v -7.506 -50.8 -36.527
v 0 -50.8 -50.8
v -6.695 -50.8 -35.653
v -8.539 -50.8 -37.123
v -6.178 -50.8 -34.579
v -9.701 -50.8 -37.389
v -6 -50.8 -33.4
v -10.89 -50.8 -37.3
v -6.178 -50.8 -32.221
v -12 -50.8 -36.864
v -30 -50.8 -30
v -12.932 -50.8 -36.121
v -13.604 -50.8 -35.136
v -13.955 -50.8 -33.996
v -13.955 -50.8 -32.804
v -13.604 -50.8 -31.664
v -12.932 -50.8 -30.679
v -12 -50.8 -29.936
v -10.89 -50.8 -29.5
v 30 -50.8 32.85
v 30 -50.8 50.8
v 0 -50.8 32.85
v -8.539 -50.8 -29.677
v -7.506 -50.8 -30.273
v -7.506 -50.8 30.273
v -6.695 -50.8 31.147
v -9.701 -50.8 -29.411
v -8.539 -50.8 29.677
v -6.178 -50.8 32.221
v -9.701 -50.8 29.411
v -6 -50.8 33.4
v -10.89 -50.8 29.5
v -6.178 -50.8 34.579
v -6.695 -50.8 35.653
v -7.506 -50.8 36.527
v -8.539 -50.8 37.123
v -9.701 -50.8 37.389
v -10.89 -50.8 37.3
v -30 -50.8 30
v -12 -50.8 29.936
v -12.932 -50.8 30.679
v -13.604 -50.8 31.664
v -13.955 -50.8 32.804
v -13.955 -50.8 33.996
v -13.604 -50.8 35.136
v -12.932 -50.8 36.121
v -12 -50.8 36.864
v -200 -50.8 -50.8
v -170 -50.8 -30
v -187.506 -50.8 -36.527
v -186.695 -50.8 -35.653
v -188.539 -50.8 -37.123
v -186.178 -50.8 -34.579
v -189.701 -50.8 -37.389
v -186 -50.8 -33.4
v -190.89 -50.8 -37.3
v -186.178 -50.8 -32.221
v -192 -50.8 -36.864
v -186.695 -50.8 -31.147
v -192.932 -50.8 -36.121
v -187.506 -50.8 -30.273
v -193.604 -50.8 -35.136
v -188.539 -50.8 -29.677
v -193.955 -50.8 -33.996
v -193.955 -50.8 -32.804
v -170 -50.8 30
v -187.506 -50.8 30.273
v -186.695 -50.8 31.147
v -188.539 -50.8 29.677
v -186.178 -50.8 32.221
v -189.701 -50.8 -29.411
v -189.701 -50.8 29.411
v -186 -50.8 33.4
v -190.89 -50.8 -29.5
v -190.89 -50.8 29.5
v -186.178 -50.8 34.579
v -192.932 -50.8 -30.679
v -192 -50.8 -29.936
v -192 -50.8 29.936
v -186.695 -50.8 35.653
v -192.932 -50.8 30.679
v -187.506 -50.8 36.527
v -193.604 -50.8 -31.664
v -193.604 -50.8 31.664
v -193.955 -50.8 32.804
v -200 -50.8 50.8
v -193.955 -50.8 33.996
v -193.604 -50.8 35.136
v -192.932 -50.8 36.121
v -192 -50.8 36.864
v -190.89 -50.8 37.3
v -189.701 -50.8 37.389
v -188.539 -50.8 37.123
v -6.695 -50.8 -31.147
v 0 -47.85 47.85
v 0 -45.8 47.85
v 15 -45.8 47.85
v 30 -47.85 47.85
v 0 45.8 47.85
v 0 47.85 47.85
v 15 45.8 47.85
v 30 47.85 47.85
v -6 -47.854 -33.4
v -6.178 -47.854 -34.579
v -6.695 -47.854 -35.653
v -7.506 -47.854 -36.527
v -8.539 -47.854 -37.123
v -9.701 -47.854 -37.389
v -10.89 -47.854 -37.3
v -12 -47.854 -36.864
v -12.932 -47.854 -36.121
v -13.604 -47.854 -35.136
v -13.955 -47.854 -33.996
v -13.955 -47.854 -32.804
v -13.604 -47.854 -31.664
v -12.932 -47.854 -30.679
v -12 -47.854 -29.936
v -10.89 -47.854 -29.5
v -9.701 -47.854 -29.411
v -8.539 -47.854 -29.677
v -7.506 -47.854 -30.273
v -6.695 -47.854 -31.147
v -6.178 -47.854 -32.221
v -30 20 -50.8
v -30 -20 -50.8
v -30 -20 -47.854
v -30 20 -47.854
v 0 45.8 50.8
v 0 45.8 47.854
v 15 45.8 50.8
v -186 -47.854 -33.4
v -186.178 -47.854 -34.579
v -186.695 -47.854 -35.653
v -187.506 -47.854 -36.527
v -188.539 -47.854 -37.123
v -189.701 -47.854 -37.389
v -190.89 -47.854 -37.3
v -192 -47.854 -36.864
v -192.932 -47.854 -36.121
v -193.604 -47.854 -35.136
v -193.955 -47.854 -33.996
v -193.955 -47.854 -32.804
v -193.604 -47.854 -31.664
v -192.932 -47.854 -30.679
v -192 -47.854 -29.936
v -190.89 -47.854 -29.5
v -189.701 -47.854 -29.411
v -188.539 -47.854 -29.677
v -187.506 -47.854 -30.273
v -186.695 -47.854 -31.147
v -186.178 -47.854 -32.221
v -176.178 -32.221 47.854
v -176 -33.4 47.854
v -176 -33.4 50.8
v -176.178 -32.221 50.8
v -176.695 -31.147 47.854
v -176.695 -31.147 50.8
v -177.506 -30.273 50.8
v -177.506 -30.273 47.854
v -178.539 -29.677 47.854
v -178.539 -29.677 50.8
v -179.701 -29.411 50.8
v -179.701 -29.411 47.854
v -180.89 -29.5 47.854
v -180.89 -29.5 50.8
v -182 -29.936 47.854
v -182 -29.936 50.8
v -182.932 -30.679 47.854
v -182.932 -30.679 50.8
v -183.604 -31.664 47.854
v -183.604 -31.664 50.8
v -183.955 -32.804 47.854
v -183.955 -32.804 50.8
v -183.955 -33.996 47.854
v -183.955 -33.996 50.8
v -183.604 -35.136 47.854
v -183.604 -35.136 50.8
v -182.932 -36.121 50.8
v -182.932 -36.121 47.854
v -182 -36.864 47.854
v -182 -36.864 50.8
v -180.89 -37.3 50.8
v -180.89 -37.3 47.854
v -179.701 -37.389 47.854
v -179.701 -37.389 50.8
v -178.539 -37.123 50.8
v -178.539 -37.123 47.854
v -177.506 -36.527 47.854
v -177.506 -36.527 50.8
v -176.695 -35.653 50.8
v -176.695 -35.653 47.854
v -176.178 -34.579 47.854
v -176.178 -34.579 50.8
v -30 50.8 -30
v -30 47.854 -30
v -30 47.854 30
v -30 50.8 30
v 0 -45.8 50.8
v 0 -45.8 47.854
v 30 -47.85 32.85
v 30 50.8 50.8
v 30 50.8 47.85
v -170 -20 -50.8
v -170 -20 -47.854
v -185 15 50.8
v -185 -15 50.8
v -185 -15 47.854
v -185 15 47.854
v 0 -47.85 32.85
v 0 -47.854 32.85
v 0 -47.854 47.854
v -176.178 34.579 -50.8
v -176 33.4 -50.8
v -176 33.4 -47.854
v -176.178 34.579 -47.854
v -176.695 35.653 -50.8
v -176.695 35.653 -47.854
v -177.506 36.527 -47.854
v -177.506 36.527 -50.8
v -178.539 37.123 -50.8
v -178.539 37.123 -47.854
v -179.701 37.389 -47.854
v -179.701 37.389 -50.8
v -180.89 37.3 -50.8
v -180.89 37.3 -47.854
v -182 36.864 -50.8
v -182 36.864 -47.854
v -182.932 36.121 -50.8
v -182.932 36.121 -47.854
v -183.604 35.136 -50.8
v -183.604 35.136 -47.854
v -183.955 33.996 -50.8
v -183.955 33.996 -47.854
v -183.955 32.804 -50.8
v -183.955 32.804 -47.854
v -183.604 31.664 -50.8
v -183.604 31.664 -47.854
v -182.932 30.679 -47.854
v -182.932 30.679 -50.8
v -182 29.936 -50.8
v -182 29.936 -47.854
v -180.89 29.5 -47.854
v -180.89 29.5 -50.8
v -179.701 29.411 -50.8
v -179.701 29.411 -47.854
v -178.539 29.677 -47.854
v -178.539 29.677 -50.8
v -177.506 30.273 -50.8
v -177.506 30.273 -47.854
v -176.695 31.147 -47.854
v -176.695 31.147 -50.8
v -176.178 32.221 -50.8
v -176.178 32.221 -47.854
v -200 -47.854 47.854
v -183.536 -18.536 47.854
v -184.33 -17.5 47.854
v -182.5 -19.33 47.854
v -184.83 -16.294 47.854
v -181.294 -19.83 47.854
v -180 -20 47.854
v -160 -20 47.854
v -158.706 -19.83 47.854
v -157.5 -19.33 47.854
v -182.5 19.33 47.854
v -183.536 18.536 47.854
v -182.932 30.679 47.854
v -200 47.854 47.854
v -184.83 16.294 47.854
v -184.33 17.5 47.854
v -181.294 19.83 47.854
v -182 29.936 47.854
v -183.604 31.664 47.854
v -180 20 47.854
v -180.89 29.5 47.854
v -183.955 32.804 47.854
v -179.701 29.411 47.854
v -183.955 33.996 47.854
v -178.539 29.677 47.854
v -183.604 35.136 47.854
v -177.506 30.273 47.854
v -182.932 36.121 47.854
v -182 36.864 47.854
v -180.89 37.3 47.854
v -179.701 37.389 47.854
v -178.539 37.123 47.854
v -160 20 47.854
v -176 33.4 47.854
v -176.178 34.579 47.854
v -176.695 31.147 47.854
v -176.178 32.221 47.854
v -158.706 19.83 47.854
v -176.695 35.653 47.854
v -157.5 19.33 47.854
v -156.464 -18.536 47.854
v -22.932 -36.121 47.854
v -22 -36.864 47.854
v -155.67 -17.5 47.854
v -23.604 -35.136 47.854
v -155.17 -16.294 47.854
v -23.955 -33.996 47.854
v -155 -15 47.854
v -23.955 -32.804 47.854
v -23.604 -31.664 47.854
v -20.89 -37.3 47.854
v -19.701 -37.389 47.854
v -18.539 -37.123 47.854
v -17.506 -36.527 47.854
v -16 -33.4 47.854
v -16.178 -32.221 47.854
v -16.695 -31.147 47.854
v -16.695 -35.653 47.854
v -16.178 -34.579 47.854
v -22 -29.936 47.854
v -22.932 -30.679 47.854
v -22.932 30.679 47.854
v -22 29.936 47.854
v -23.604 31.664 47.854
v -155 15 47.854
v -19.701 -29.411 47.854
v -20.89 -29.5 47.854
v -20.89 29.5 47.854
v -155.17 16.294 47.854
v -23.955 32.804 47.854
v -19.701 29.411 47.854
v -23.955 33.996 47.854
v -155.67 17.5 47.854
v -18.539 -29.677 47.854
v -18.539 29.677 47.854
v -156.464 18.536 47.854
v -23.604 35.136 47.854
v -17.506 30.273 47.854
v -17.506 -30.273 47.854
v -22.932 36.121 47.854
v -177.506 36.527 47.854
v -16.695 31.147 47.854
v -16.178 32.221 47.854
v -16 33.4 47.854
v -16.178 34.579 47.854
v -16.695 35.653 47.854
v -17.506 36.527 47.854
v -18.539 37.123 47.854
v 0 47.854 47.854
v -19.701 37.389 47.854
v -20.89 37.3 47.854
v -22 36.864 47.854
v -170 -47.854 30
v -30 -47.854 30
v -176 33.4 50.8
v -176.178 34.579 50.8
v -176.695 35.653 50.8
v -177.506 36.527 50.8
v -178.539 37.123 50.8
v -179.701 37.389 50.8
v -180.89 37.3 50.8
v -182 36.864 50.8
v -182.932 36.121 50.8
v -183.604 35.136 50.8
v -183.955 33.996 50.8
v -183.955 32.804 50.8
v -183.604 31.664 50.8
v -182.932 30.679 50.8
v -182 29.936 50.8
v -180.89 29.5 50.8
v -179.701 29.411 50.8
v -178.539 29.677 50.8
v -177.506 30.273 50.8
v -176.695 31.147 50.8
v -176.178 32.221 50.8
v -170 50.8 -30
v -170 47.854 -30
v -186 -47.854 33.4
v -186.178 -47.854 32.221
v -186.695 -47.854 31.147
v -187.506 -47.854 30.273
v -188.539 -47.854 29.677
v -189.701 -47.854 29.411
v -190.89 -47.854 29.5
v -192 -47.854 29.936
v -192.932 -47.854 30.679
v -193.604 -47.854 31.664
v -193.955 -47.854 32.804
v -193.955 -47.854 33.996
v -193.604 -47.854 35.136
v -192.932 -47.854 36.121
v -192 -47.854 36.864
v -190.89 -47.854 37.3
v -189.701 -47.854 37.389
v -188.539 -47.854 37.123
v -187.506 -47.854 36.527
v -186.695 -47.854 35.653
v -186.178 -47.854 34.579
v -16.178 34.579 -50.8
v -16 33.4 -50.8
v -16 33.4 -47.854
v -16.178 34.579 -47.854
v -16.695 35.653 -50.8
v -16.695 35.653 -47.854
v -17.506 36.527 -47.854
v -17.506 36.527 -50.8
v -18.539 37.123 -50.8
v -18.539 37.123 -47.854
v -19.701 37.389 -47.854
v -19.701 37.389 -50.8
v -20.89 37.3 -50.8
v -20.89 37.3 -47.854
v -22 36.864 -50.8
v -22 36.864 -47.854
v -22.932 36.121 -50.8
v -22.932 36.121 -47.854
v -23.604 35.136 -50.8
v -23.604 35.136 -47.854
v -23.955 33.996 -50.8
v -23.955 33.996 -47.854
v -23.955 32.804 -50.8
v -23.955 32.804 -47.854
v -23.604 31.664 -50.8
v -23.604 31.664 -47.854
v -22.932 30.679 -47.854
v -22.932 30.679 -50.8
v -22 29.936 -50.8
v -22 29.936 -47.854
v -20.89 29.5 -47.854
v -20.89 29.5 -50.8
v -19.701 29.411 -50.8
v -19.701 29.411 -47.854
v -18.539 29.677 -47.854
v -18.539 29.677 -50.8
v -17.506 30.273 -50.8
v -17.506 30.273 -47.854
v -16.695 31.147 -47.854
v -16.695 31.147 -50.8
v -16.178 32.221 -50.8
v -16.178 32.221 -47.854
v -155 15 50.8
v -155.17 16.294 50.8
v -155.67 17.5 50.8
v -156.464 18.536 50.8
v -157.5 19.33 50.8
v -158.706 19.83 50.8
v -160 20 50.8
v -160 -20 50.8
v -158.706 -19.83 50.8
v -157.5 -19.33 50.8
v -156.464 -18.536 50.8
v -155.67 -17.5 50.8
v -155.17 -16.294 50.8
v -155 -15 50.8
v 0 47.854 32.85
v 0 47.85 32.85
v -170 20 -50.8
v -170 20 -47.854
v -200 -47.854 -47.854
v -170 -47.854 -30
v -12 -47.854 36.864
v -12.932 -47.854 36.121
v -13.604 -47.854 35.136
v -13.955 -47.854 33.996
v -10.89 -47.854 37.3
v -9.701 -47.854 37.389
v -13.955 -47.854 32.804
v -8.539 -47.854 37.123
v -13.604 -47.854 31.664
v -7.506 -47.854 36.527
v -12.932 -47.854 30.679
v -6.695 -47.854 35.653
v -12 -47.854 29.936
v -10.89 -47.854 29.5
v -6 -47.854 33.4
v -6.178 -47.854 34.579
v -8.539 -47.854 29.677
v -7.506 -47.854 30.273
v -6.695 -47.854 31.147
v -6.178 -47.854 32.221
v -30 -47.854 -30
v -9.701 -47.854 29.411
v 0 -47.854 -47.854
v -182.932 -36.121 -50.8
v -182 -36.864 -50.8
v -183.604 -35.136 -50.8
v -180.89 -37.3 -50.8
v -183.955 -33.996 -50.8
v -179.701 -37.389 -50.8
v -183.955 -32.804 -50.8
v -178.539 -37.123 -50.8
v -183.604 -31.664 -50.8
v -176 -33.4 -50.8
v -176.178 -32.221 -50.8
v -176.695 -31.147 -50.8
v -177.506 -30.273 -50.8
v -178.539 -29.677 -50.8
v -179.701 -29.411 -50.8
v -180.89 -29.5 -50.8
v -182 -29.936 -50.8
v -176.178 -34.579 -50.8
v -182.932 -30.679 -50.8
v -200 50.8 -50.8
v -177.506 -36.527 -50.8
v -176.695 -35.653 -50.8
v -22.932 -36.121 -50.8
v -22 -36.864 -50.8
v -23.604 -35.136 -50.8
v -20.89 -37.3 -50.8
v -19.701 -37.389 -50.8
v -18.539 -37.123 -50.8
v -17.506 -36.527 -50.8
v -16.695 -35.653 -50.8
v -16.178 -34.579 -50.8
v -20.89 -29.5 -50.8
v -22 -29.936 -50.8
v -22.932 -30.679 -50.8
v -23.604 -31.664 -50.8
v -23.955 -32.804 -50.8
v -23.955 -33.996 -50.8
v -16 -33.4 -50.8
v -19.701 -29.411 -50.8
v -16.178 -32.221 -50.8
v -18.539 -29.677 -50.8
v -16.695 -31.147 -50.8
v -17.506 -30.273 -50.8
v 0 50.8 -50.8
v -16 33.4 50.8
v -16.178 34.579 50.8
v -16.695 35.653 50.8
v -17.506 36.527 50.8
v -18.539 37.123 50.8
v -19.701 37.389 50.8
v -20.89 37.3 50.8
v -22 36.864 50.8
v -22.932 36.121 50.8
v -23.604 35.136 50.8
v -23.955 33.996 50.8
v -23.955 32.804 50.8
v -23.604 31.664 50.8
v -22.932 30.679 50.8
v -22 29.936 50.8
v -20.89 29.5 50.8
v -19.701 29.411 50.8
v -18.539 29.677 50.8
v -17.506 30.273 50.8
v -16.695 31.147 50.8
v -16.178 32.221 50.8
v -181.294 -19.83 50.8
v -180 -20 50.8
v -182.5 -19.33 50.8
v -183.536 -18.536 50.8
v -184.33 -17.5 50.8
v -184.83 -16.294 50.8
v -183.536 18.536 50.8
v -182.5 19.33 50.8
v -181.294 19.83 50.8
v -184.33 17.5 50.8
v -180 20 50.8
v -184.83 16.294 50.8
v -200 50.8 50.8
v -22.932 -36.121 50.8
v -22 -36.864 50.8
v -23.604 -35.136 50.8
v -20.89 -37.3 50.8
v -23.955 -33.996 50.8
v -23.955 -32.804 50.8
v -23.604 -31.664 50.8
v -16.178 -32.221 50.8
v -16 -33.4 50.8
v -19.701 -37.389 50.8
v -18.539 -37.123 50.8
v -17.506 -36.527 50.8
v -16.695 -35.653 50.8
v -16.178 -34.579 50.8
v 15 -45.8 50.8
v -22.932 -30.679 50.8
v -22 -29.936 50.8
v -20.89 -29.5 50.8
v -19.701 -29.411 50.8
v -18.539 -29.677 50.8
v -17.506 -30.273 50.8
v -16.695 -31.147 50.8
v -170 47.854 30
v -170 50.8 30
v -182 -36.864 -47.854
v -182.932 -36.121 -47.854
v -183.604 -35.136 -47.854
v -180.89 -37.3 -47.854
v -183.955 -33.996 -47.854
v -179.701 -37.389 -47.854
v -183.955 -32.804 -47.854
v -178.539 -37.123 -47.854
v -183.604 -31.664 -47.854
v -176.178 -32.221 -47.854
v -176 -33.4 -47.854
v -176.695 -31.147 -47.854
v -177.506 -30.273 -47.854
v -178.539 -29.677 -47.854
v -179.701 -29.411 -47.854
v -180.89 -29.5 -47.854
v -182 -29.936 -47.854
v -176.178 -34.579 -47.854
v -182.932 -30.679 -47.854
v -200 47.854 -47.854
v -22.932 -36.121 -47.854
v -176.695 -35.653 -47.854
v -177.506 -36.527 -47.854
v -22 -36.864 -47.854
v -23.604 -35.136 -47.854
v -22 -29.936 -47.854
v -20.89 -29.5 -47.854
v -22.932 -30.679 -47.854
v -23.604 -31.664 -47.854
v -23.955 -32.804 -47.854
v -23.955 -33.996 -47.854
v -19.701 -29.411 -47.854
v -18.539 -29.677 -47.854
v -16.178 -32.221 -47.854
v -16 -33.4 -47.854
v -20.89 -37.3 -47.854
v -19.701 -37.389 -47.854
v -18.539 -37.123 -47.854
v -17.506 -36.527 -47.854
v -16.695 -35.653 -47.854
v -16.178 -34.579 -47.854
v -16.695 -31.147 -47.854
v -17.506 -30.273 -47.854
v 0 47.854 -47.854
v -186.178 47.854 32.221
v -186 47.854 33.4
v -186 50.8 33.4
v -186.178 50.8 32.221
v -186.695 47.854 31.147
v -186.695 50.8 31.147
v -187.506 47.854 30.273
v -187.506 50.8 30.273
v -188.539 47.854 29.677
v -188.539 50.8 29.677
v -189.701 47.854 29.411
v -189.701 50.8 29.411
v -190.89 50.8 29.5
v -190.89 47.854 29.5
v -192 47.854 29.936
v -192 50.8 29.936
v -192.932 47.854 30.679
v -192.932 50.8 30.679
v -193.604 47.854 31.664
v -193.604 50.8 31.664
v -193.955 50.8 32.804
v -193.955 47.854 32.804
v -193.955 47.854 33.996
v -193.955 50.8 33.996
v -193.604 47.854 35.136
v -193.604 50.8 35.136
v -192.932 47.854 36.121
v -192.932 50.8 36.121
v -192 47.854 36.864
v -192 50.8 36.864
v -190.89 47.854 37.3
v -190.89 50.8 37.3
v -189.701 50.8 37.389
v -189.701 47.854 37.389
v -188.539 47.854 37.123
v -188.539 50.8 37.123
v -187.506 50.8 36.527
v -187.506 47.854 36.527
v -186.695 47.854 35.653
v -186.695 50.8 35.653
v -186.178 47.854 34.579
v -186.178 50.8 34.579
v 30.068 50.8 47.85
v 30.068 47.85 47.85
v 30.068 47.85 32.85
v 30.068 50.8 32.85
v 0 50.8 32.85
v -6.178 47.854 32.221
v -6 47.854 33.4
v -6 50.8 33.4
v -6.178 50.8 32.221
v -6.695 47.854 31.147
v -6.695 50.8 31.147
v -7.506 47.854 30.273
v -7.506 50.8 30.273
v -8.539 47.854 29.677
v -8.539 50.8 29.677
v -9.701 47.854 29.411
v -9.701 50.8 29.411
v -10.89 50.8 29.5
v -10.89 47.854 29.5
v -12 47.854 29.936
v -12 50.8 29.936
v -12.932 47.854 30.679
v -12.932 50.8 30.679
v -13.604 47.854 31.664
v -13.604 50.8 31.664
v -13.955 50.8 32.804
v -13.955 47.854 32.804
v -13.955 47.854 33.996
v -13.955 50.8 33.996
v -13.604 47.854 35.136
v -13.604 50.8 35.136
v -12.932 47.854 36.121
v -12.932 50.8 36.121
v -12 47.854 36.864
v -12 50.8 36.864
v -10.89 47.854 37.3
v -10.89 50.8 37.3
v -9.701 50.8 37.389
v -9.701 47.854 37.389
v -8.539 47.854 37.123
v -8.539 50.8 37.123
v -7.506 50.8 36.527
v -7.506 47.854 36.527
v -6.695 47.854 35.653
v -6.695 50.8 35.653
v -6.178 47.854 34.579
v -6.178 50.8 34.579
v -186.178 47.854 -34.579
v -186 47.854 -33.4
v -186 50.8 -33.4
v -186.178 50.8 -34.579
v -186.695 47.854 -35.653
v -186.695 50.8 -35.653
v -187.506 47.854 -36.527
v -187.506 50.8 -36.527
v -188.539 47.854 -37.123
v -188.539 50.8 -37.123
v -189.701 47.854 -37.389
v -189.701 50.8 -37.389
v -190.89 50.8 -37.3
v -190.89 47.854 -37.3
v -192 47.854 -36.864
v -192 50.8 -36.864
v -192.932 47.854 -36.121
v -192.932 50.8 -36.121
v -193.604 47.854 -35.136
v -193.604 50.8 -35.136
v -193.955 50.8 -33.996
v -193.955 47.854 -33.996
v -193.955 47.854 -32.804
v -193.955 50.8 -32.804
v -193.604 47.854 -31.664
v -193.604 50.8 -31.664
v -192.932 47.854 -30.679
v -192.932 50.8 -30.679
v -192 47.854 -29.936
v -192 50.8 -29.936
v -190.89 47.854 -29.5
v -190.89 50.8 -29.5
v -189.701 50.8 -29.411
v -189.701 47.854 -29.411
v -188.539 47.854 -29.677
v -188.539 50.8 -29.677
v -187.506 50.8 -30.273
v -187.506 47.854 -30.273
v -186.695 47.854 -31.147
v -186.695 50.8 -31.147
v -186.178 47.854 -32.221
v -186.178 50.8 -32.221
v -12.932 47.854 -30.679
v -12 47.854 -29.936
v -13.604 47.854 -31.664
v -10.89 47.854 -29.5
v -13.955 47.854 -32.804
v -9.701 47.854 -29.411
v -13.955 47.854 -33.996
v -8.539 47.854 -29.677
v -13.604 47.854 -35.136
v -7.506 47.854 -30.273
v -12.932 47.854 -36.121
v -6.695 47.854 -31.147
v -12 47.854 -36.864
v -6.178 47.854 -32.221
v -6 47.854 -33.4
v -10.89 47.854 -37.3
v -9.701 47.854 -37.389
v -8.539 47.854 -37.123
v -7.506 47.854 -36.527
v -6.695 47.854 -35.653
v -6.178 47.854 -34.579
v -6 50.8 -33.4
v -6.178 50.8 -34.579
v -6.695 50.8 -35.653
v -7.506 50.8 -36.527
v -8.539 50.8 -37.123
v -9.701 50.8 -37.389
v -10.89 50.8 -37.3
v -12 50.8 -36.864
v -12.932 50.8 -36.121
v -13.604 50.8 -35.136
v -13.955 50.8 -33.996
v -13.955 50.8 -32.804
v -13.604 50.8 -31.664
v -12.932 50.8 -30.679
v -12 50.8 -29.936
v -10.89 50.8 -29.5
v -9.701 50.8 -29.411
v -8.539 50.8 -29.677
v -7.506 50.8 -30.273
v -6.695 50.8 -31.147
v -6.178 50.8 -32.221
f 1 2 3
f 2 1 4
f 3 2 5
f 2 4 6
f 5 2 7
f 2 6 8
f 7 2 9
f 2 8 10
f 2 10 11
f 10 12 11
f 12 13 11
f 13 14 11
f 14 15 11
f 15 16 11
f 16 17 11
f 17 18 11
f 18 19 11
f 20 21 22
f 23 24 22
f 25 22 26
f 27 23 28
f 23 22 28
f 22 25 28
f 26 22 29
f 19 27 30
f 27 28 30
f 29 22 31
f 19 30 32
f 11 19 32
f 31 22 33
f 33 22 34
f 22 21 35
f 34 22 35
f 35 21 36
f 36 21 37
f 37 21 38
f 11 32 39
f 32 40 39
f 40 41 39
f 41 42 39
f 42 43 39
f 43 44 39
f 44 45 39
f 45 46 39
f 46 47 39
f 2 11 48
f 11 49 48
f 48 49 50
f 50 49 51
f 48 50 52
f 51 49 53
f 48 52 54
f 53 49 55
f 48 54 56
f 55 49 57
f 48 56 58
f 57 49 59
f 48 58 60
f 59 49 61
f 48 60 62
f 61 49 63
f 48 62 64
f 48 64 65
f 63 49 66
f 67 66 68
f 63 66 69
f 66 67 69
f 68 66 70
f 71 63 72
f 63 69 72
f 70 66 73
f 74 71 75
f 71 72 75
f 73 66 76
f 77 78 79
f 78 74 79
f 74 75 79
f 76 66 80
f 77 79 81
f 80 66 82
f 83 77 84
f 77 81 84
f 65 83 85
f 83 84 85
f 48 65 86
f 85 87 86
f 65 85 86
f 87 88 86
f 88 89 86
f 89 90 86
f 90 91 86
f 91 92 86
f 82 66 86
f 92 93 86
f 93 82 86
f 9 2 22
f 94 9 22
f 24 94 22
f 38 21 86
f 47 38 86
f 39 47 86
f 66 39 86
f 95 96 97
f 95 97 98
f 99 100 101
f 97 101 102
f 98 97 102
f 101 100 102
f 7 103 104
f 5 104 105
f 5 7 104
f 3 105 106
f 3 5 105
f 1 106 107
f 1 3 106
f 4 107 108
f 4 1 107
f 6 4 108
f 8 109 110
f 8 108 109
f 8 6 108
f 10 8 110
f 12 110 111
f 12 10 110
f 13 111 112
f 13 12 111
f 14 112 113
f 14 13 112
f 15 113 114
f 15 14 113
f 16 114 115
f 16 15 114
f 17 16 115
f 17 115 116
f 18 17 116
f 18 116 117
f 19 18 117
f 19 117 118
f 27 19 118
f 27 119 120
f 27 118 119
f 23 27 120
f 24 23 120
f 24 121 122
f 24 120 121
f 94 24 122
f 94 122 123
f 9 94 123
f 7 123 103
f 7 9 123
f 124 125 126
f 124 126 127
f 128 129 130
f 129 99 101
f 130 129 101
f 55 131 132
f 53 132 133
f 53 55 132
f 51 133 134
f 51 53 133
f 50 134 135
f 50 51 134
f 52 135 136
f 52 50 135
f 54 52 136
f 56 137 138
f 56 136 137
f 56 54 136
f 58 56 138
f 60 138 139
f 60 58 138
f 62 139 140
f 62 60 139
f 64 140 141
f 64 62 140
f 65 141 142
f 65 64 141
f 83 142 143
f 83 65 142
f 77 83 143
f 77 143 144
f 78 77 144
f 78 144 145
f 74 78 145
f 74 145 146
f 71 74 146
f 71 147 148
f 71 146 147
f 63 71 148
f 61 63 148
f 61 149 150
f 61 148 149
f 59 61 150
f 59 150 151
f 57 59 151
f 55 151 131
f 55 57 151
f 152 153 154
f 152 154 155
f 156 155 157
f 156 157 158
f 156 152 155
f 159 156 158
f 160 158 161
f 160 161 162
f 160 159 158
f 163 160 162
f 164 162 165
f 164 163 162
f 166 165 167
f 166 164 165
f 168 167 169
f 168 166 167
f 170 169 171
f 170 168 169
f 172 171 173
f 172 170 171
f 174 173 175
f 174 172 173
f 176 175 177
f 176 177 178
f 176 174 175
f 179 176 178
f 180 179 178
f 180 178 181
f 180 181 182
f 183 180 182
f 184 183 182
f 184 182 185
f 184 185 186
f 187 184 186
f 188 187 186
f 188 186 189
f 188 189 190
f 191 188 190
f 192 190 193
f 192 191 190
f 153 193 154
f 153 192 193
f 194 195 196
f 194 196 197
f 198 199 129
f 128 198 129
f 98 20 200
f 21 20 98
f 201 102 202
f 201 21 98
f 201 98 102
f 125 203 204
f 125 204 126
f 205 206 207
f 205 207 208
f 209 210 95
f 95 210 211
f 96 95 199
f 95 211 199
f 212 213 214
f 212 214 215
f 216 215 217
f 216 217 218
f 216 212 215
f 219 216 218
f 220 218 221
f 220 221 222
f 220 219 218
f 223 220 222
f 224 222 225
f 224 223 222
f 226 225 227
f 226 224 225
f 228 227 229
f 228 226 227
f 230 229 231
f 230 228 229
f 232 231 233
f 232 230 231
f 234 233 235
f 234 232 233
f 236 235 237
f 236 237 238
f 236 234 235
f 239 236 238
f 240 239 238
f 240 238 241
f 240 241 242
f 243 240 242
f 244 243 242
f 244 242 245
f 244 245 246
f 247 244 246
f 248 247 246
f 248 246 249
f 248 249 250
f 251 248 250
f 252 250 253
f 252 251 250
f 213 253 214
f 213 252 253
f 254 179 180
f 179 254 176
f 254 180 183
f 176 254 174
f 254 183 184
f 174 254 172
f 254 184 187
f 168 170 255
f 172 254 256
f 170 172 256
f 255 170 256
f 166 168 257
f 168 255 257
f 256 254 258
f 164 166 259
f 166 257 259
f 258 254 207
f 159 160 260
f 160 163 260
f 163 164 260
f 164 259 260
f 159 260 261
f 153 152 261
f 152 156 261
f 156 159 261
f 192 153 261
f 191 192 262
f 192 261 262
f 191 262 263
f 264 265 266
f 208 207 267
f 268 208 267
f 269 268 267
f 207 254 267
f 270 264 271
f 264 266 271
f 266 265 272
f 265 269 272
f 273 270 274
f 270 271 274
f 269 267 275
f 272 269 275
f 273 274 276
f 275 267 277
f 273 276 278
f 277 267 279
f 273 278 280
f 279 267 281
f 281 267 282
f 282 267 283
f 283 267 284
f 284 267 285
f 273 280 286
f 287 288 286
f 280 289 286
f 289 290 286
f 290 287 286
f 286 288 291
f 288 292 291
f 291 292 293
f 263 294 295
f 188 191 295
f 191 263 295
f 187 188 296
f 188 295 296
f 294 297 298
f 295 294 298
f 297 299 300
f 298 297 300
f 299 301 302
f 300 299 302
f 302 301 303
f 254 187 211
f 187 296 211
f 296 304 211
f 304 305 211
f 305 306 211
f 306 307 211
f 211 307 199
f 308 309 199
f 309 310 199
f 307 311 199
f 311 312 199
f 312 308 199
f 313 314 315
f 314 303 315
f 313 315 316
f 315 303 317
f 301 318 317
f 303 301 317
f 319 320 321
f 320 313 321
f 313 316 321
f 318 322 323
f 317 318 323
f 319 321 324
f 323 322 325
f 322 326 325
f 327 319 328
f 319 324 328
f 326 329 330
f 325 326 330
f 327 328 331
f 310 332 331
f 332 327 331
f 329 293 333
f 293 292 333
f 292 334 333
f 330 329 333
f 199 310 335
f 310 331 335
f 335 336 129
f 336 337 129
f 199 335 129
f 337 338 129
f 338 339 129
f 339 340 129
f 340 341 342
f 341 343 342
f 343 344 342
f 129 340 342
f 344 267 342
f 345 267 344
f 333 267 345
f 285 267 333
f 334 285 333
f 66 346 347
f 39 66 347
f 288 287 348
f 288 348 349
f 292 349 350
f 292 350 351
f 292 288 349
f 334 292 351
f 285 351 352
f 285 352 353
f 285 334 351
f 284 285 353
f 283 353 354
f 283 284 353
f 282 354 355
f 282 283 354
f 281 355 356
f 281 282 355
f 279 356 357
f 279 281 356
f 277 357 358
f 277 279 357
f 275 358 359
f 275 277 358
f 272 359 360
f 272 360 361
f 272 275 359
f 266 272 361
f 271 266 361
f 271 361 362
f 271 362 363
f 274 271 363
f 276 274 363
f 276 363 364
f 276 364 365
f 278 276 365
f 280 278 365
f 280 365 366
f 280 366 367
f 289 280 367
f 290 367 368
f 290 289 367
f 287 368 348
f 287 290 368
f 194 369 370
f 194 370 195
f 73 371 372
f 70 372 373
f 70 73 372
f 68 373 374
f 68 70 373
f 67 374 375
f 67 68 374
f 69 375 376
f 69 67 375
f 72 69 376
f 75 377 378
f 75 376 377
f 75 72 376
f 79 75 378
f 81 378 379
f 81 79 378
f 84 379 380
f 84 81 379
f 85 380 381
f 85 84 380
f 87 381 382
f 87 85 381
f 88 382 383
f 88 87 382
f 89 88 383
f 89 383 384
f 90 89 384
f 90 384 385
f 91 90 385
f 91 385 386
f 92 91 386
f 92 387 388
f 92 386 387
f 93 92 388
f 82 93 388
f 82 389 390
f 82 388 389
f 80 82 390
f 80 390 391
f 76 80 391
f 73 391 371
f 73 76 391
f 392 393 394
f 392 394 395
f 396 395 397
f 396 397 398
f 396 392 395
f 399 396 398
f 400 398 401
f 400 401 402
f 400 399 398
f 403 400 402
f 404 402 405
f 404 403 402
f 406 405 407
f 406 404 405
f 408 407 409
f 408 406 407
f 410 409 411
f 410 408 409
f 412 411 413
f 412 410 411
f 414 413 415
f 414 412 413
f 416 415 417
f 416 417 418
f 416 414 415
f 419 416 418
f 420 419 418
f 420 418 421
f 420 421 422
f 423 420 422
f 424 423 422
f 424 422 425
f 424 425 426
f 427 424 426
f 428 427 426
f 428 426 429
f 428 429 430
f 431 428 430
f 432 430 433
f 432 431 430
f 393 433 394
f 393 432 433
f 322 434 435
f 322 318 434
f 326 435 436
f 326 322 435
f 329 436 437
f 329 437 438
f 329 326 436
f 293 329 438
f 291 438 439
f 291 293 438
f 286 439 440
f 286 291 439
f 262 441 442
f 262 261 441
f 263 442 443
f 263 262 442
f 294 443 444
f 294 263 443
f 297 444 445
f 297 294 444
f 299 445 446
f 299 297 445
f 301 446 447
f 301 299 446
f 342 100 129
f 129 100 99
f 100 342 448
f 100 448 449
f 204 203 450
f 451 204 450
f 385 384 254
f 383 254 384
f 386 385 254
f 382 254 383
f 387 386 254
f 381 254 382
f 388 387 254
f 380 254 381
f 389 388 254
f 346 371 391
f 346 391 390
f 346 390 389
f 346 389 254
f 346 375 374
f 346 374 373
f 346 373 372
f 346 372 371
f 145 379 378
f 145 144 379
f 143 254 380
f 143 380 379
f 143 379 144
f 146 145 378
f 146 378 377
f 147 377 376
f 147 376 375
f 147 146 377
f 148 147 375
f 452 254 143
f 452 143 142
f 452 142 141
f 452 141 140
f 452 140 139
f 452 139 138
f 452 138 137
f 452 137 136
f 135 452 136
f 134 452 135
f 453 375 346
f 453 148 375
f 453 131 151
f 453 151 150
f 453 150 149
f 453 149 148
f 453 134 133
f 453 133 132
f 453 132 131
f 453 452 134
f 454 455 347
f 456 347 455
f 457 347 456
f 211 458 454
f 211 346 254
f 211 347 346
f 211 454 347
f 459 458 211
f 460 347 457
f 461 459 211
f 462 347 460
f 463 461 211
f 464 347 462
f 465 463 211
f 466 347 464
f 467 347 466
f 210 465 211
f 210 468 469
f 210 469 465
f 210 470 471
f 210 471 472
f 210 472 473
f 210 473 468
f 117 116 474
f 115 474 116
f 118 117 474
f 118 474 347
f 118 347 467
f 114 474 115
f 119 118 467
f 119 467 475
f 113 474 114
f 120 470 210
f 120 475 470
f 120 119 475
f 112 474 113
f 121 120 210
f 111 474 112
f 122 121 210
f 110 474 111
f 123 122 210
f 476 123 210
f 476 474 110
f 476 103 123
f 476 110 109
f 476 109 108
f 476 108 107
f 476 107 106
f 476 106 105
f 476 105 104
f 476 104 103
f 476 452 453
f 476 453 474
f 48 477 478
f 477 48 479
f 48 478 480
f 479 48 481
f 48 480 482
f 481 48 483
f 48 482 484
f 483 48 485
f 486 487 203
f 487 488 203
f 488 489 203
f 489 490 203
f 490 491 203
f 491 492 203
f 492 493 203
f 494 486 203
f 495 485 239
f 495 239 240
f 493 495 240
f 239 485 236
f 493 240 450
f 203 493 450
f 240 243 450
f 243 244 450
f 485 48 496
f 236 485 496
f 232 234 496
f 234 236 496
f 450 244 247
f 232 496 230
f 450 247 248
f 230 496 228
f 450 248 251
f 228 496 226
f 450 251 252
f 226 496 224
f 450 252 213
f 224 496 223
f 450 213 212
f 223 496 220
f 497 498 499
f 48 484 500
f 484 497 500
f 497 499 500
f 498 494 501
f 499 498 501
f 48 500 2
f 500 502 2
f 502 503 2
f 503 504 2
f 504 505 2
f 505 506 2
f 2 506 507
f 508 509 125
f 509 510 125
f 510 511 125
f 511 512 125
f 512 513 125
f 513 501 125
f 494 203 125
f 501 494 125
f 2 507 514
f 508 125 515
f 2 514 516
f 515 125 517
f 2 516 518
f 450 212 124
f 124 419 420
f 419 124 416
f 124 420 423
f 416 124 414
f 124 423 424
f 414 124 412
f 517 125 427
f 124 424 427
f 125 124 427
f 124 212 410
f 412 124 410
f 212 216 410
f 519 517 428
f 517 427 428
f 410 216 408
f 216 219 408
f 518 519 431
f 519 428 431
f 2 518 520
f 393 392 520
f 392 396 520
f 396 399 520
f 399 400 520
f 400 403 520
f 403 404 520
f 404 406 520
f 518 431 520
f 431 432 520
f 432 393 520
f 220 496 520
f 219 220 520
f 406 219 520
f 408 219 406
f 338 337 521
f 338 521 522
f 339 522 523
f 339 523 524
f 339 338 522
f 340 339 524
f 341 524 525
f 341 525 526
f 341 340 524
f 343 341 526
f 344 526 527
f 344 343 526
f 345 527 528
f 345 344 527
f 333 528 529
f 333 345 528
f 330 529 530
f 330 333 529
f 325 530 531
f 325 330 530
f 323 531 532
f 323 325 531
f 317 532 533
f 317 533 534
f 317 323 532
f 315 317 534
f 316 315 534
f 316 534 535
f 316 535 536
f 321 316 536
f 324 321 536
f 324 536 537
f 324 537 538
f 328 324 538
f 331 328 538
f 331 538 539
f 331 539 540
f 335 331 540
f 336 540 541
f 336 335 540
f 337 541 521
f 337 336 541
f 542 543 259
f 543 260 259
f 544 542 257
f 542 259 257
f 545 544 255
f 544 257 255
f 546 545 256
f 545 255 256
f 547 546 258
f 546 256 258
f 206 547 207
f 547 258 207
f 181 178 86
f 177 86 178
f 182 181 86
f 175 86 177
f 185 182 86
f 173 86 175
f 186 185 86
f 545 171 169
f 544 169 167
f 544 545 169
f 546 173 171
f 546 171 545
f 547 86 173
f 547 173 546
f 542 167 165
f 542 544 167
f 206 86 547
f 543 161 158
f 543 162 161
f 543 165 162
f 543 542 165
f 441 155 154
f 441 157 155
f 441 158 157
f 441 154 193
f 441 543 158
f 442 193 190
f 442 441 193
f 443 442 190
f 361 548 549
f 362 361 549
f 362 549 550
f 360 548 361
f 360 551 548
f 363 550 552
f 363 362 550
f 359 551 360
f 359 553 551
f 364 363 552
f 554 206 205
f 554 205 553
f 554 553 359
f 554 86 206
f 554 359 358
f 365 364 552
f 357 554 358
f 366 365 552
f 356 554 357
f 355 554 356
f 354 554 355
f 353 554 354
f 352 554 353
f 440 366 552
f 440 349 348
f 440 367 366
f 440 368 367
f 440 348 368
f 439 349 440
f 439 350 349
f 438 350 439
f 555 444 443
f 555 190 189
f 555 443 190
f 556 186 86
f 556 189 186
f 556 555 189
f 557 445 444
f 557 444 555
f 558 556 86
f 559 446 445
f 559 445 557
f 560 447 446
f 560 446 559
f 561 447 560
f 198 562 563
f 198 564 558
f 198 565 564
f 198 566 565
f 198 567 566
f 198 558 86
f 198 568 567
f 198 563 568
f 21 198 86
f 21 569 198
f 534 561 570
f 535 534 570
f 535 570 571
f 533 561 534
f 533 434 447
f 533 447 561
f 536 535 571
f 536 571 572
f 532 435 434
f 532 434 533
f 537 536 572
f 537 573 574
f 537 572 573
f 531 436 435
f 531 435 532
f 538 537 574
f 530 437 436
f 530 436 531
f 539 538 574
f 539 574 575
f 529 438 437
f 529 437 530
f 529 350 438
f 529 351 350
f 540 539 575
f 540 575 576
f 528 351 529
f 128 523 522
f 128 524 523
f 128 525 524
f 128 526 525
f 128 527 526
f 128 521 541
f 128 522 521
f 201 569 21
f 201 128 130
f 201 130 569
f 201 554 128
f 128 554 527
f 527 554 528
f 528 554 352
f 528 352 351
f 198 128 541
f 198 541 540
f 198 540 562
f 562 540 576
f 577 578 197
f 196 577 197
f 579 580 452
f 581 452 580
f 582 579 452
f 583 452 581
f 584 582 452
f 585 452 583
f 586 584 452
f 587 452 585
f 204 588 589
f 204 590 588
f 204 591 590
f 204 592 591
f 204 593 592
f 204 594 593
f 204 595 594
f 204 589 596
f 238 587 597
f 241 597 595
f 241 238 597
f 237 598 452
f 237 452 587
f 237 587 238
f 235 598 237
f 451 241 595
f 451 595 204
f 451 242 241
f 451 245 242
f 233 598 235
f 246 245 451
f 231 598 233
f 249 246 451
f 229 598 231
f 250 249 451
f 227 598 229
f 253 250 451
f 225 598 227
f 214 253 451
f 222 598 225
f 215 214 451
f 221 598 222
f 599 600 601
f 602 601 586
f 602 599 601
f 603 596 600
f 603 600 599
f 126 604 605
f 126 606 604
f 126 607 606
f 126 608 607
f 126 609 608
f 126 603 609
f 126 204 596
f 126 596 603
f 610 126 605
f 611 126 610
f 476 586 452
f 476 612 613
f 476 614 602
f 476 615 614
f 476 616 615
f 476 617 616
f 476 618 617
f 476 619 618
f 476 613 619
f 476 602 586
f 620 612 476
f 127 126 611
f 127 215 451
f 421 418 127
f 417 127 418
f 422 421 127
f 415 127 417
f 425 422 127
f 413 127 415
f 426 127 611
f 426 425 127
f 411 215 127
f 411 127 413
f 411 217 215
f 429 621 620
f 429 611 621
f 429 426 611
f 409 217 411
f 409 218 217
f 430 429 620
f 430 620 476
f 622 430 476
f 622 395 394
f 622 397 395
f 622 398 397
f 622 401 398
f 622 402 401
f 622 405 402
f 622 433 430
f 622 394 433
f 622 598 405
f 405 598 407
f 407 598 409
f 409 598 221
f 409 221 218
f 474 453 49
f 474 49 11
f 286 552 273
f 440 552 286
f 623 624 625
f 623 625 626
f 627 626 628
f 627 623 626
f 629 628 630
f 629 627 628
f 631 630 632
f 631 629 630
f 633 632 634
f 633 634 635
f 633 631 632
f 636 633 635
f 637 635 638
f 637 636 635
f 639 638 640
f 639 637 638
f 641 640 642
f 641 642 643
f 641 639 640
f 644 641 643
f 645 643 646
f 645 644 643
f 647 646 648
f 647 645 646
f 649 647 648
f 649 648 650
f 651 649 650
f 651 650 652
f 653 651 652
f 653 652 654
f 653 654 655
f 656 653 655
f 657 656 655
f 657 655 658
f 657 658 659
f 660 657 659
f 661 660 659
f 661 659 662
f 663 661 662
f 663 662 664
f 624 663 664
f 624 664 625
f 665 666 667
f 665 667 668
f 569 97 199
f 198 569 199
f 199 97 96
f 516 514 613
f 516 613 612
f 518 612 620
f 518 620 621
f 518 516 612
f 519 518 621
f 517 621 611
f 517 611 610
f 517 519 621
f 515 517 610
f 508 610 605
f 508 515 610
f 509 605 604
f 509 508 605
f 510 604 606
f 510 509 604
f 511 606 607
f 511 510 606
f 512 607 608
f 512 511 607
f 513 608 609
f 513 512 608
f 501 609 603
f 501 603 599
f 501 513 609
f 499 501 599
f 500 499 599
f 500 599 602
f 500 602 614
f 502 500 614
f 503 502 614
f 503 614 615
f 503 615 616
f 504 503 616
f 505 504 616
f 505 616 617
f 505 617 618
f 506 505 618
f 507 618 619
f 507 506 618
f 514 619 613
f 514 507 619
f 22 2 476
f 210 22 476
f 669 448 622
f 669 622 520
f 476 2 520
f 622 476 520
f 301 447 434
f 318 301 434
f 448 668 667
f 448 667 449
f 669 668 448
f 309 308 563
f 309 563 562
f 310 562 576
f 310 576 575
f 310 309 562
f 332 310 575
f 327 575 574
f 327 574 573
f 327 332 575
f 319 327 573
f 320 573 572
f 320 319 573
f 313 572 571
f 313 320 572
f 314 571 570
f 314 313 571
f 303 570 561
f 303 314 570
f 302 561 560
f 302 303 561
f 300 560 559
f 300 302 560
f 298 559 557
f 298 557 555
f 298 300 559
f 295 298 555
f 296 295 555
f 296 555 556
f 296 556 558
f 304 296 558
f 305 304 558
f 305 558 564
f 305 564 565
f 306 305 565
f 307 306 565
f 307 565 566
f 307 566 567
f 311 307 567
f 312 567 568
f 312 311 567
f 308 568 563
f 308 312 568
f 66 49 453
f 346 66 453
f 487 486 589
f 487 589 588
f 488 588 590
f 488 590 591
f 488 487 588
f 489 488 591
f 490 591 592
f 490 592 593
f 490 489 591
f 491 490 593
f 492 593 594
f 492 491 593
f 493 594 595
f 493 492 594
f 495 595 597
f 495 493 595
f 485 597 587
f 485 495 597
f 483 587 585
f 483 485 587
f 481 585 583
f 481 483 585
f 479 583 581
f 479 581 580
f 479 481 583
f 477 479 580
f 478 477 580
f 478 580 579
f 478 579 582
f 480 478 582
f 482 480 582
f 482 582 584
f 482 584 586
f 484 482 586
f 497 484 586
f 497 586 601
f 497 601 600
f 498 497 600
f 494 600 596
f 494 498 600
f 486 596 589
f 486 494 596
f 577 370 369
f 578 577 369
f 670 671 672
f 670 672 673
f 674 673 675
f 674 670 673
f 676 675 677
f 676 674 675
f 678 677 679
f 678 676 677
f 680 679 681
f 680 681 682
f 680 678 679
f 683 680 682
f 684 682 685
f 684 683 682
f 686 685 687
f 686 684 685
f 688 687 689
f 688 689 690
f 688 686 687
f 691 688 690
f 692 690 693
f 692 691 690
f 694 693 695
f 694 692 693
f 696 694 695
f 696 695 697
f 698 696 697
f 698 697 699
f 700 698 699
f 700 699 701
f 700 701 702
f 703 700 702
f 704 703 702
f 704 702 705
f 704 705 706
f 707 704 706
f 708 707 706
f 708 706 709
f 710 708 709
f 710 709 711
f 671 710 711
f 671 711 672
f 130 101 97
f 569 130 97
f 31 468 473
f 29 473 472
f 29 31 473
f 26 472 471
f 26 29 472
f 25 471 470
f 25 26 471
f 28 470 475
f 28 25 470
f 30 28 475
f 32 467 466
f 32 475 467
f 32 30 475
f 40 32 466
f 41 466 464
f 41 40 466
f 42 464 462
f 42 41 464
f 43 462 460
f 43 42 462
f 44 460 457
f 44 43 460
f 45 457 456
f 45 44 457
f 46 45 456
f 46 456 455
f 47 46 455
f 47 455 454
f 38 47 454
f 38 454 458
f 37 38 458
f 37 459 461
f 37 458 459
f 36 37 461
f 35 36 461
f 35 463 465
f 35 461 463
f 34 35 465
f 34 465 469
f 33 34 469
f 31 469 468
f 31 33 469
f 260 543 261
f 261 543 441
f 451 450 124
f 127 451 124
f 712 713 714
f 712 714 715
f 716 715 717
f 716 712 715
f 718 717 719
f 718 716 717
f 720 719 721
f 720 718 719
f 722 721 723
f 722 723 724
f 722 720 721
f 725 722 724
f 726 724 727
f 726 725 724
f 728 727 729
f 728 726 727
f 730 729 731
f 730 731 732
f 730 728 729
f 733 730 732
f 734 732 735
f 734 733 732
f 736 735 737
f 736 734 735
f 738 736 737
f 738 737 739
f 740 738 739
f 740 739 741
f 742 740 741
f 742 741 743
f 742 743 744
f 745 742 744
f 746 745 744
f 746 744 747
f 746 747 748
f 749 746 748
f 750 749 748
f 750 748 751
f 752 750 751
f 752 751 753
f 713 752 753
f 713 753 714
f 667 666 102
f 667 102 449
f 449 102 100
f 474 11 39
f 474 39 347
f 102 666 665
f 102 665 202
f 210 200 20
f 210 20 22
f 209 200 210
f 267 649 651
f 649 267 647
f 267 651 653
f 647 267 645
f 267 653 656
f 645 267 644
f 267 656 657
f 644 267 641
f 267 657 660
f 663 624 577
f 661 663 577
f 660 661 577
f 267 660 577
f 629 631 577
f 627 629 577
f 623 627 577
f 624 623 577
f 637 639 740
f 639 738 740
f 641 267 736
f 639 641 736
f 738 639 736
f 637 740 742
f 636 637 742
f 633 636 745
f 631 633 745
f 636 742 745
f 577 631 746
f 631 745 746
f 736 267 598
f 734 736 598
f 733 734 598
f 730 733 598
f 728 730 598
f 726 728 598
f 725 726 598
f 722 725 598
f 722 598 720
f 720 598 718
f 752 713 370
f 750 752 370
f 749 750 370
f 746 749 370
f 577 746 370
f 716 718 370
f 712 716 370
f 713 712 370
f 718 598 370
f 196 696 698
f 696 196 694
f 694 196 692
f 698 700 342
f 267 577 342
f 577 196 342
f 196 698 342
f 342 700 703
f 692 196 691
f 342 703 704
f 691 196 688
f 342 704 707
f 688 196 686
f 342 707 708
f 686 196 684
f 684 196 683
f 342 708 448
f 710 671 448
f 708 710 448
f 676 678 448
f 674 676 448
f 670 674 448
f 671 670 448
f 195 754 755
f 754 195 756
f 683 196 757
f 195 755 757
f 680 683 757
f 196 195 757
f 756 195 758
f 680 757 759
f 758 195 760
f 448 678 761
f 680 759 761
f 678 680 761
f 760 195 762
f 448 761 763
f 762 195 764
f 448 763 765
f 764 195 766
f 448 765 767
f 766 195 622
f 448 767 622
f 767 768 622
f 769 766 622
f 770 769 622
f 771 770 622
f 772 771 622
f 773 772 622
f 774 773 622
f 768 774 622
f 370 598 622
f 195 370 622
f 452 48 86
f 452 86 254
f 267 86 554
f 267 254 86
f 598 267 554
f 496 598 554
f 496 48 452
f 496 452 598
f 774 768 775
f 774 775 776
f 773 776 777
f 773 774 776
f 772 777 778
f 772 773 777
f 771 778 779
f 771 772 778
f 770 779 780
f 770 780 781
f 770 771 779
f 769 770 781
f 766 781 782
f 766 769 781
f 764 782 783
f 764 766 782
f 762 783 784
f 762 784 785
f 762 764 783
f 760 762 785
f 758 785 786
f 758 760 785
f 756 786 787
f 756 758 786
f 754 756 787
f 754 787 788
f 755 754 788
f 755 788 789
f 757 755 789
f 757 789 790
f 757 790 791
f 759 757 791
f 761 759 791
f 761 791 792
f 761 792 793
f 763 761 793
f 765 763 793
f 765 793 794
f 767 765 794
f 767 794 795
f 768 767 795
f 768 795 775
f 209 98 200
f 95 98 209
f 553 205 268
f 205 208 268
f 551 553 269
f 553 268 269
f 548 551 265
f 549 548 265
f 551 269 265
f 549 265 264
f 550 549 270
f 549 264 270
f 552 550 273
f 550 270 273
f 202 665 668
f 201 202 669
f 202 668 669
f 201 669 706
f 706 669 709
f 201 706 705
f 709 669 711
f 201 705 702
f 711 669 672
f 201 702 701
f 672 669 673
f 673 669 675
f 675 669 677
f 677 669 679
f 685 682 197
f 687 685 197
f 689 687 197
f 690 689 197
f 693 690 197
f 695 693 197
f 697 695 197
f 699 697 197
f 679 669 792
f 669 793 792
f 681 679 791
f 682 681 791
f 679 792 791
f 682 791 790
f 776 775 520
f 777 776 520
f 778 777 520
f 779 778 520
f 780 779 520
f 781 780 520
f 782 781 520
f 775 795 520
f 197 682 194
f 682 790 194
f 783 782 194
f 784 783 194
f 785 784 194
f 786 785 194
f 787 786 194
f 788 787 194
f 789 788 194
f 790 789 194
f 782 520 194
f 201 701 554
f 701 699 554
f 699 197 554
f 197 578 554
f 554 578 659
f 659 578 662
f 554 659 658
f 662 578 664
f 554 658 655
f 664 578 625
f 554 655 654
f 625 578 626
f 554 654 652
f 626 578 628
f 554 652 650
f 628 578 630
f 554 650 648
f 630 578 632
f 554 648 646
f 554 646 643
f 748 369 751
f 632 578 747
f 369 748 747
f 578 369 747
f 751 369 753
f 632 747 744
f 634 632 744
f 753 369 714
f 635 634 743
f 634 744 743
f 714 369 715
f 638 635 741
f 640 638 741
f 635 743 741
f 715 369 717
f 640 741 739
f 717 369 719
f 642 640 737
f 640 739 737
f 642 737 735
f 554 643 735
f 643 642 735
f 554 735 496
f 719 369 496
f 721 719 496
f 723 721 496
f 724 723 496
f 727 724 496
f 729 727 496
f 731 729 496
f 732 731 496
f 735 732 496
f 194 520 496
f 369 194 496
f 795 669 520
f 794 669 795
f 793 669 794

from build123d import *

# Parameters (mm, degrees)
BOSS_EXTRUDE1_START         = -2.9464
BOSS_EXTRUDE1_OUTLINE_W     = 230
BOSS_EXTRUDE1_OUTLINE_H     = 101.6
BOSS_EXTRUDE1_OUTLINE_R     = 4
BOSS_EXTRUDE1_OUTLINE_W_2   = 15
BOSS_EXTRUDE1_OUTLINE_H_2   = 91.6
BOSS_EXTRUDE1_DEPTH         = 2.9464
BOSS_EXTRUDE1_START_2       = -101.6
BOSS_EXTRUDE1_2_OUTLINE_W   = 200
BOSS_EXTRUDE1_2_OUTLINE_H   = 101.6
BOSS_EXTRUDE1_2_OUTLINE_R   = 4
BOSS_EXTRUDE1_2_OUTLINE_W_2 = 140
BOSS_EXTRUDE1_2_OUTLINE_H_2 = 40
BOSS_EXTRUDE1_2_DEPTH       = 2.9464
BOSS_EXTRUDE1_START_3       = -98.6536
BOSS_EXTRUDE1_3_OUTLINE_W   = 30
BOSS_EXTRUDE1_3_OUTLINE_H   = 2.9464
BOSS_EXTRUDE1_3_DEPTH       = 95.7072
BOSS_EXTRUDE1_4_OUTLINE_W   = 140
BOSS_EXTRUDE1_4_OUTLINE_H   = 2.9464
BOSS_EXTRUDE1_4_DEPTH       = 17.8536
BOSS_EXTRUDE1_START_4       = -20.8
BOSS_EXTRUDE1_5_OUTLINE_W   = 140
BOSS_EXTRUDE1_5_OUTLINE_H   = 2.9464
BOSS_EXTRUDE1_5_DEPTH       = 17.8536
BOSS_EXTRUDE1_START_5       = -2.95
BOSS_EXTRUDE1_6_DEPTH       = 0.0036
BOSS_EXTRUDE1_START_6       = -50.8
BOSS_EXTRUDE1_7_OUTLINE_R   = 4
BOSS_EXTRUDE1_7_DEPTH       = 101.6
SKETCH3_W                   = 30
SKETCH3_H                   = 2.95
SKETCH3_W_2                 = 30.067744433
BOSS_EXTRUDE2_DEPTH         = 15
CUT_EXTRUDE1_REACH          = 232.007
SKETCH4_W                   = 30
SKETCH4_H                   = 40
FILLET1_R                   = 5
FILLET2_R                   = 5
FILLET3_R                   = 5
FILLET4_R                   = 5


with BuildPart() as part:
    # Boss-Extrude1: read off the stored shape, not the designer's step
    # Boss-Extrude1 outline → Boss-Extrude1 (new body)
    with BuildSketch(Plane.XY.offset(50.8).offset(BOSS_EXTRUDE1_START)):
        with Locations((-85, 0)):
            Rectangle(BOSS_EXTRUDE1_OUTLINE_W, BOSS_EXTRUDE1_OUTLINE_H)
        with Locations((-20, 33.4)):
            Circle(BOSS_EXTRUDE1_OUTLINE_R, mode=Mode.SUBTRACT)
        with Locations((-180, 33.4)):
            Circle(BOSS_EXTRUDE1_OUTLINE_R, mode=Mode.SUBTRACT)
        with Locations((7.5, 0)):
            Rectangle(BOSS_EXTRUDE1_OUTLINE_W_2, BOSS_EXTRUDE1_OUTLINE_H_2, mode=Mode.SUBTRACT)
        with Locations((-180, -33.4)):
            Circle(BOSS_EXTRUDE1_OUTLINE_R, mode=Mode.SUBTRACT)
        with Locations((-20, -33.4)):
            Circle(BOSS_EXTRUDE1_OUTLINE_R, mode=Mode.SUBTRACT)
    extrude(amount=BOSS_EXTRUDE1_DEPTH)



with BuildPart() as body_2:
    # Boss-Extrude1 2 outline → Boss-Extrude1 2 (new body)
    with BuildSketch(Plane.XY.offset(50.8).offset(BOSS_EXTRUDE1_START_2)):
        with Locations((-100, 0)):
            Rectangle(BOSS_EXTRUDE1_2_OUTLINE_W, BOSS_EXTRUDE1_2_OUTLINE_H)
        with Locations((-20, 33.4)):
            Circle(BOSS_EXTRUDE1_2_OUTLINE_R, mode=Mode.SUBTRACT)
        with Locations((-180, 33.4)):
            Circle(BOSS_EXTRUDE1_2_OUTLINE_R, mode=Mode.SUBTRACT)
        with Locations((-180, -33.4)):
            Circle(BOSS_EXTRUDE1_2_OUTLINE_R, mode=Mode.SUBTRACT)
        with Locations((-100, 0)):
            Rectangle(BOSS_EXTRUDE1_2_OUTLINE_W_2, BOSS_EXTRUDE1_2_OUTLINE_H_2, mode=Mode.SUBTRACT)
        with Locations((-20, -33.4)):
            Circle(BOSS_EXTRUDE1_2_OUTLINE_R, mode=Mode.SUBTRACT)
    extrude(amount=BOSS_EXTRUDE1_2_DEPTH)


with BuildPart() as part_1:
    add(part.part)

    add(body_2.part)  # Boss-Extrude1 3 merges body 2
    # Boss-Extrude1 3 outline → Boss-Extrude1 3 (add)
    with BuildSketch(Plane.XY.offset(50.8).offset(BOSS_EXTRUDE1_START_3)):
        with Locations((-15, -49.3268)):
            Rectangle(BOSS_EXTRUDE1_3_OUTLINE_W, BOSS_EXTRUDE1_3_OUTLINE_H)
        with Locations((-185, -49.3268)):
            Rectangle(BOSS_EXTRUDE1_3_OUTLINE_W, BOSS_EXTRUDE1_3_OUTLINE_H)
        with Locations((-15, 49.3268)):
            Rectangle(BOSS_EXTRUDE1_3_OUTLINE_W, BOSS_EXTRUDE1_3_OUTLINE_H)
        with Locations((-185, 49.3268)):
            Rectangle(BOSS_EXTRUDE1_3_OUTLINE_W, BOSS_EXTRUDE1_3_OUTLINE_H)
    extrude(amount=BOSS_EXTRUDE1_3_DEPTH)

    # Boss-Extrude1 4 outline → Boss-Extrude1 4 (add)
    with BuildSketch(Plane.XY.offset(50.8).offset(BOSS_EXTRUDE1_START_3)):
        with Locations((-100, -49.3268)):
            Rectangle(BOSS_EXTRUDE1_4_OUTLINE_W, BOSS_EXTRUDE1_4_OUTLINE_H)
        with Locations((-100, 49.3268)):
            Rectangle(BOSS_EXTRUDE1_4_OUTLINE_W, BOSS_EXTRUDE1_4_OUTLINE_H)
    extrude(amount=BOSS_EXTRUDE1_4_DEPTH)

    # Boss-Extrude1 5 outline → Boss-Extrude1 5 (add)
    with BuildSketch(Plane.XY.offset(50.8).offset(BOSS_EXTRUDE1_START_4)):
        with Locations((-100, -49.3268)):
            Rectangle(BOSS_EXTRUDE1_5_OUTLINE_W, BOSS_EXTRUDE1_5_OUTLINE_H)
        with Locations((-100, 49.3268)):
            Rectangle(BOSS_EXTRUDE1_5_OUTLINE_W, BOSS_EXTRUDE1_5_OUTLINE_H)
    extrude(amount=BOSS_EXTRUDE1_5_DEPTH)

    # Boss-Extrude1 6 outline → Boss-Extrude1 6 (add)
    with BuildSketch(Plane.XY.offset(50.8).offset(BOSS_EXTRUDE1_START_5)):
        Polygon((0, -45.8), (0, -50.8), (30, -50.8), (30, 50.8), (0, 50.8), (0, 45.8), (15, 45.8), (15, -45.8), align=None)
    extrude(amount=BOSS_EXTRUDE1_6_DEPTH)

    # Boss-Extrude1 7 outline → Boss-Extrude1 7 (cut)
    with BuildSketch(Plane(origin=(0, 0, 0), x_dir=(1, 0, 0), z_dir=(0, 1, 0)).offset(BOSS_EXTRUDE1_START_6)):
        with Locations((-190, 33.4)):
            Circle(BOSS_EXTRUDE1_7_OUTLINE_R)
        with Locations((-190, -33.4)):
            Circle(BOSS_EXTRUDE1_7_OUTLINE_R)
        with Locations((-10, 33.4)):
            Circle(BOSS_EXTRUDE1_7_OUTLINE_R)
        with Locations((-10, -33.4)):
            Circle(BOSS_EXTRUDE1_7_OUTLINE_R)
    extrude(amount=BOSS_EXTRUDE1_7_DEPTH, mode=Mode.SUBTRACT)

    # Sketch3 → Boss-Extrude2 (add)
    with BuildSketch(Plane(origin=(0, 0, 47.85), x_dir=(-1, 0, 0), z_dir=(0, 0, -1))):
        with Locations((-15, -49.325)):
            Rectangle(SKETCH3_W, SKETCH3_H)
        with Locations((-15.033872217, 49.325)):
            Rectangle(SKETCH3_W_2, SKETCH3_H)
    extrude(amount=BOSS_EXTRUDE2_DEPTH)

    # Sketch4 → Cut-Extrude1 (cut, up to next)
    with BuildSketch(Plane.XY.offset(50.8), mode=Mode.PRIVATE) as cut_extrude1_sk1:
        with Locations((-170, 0)):
            Rectangle(SKETCH4_W, SKETCH4_H)
    cut_extrude1_tool1 = extrude(cut_extrude1_sk1.sketch, amount=-CUT_EXTRUDE1_REACH, mode=Mode.PRIVATE) & part_1.part
    add(cut_extrude1_tool1.solids().sort_by_distance((-170, 0, 50.8))[0], mode=Mode.SUBTRACT)

    # Fillet1
    fillet1_edges = [part_1.edges().sort_by_distance(p)[0] for p in [
        (-155, -20, 49.3268),
    ]]
    fillet(fillet1_edges, radius=FILLET1_R)

    # Fillet2
    fillet2_edges = [part_1.edges().sort_by_distance(p)[0] for p in [
        (-155, 20, 49.3268),
    ]]
    fillet(fillet2_edges, radius=FILLET2_R)

    # Fillet3
    fillet3_edges = [part_1.edges().sort_by_distance(p)[0] for p in [
        (-185, -20, 49.3268),
    ]]
    fillet(fillet3_edges, radius=FILLET3_R)

    # Fillet4
    fillet4_edges = [part_1.edges().sort_by_distance(p)[0] for p in [
        (-185, 20, 49.3268),
    ]]
    fillet(fillet4_edges, radius=FILLET4_R)


solid = part_1.part
